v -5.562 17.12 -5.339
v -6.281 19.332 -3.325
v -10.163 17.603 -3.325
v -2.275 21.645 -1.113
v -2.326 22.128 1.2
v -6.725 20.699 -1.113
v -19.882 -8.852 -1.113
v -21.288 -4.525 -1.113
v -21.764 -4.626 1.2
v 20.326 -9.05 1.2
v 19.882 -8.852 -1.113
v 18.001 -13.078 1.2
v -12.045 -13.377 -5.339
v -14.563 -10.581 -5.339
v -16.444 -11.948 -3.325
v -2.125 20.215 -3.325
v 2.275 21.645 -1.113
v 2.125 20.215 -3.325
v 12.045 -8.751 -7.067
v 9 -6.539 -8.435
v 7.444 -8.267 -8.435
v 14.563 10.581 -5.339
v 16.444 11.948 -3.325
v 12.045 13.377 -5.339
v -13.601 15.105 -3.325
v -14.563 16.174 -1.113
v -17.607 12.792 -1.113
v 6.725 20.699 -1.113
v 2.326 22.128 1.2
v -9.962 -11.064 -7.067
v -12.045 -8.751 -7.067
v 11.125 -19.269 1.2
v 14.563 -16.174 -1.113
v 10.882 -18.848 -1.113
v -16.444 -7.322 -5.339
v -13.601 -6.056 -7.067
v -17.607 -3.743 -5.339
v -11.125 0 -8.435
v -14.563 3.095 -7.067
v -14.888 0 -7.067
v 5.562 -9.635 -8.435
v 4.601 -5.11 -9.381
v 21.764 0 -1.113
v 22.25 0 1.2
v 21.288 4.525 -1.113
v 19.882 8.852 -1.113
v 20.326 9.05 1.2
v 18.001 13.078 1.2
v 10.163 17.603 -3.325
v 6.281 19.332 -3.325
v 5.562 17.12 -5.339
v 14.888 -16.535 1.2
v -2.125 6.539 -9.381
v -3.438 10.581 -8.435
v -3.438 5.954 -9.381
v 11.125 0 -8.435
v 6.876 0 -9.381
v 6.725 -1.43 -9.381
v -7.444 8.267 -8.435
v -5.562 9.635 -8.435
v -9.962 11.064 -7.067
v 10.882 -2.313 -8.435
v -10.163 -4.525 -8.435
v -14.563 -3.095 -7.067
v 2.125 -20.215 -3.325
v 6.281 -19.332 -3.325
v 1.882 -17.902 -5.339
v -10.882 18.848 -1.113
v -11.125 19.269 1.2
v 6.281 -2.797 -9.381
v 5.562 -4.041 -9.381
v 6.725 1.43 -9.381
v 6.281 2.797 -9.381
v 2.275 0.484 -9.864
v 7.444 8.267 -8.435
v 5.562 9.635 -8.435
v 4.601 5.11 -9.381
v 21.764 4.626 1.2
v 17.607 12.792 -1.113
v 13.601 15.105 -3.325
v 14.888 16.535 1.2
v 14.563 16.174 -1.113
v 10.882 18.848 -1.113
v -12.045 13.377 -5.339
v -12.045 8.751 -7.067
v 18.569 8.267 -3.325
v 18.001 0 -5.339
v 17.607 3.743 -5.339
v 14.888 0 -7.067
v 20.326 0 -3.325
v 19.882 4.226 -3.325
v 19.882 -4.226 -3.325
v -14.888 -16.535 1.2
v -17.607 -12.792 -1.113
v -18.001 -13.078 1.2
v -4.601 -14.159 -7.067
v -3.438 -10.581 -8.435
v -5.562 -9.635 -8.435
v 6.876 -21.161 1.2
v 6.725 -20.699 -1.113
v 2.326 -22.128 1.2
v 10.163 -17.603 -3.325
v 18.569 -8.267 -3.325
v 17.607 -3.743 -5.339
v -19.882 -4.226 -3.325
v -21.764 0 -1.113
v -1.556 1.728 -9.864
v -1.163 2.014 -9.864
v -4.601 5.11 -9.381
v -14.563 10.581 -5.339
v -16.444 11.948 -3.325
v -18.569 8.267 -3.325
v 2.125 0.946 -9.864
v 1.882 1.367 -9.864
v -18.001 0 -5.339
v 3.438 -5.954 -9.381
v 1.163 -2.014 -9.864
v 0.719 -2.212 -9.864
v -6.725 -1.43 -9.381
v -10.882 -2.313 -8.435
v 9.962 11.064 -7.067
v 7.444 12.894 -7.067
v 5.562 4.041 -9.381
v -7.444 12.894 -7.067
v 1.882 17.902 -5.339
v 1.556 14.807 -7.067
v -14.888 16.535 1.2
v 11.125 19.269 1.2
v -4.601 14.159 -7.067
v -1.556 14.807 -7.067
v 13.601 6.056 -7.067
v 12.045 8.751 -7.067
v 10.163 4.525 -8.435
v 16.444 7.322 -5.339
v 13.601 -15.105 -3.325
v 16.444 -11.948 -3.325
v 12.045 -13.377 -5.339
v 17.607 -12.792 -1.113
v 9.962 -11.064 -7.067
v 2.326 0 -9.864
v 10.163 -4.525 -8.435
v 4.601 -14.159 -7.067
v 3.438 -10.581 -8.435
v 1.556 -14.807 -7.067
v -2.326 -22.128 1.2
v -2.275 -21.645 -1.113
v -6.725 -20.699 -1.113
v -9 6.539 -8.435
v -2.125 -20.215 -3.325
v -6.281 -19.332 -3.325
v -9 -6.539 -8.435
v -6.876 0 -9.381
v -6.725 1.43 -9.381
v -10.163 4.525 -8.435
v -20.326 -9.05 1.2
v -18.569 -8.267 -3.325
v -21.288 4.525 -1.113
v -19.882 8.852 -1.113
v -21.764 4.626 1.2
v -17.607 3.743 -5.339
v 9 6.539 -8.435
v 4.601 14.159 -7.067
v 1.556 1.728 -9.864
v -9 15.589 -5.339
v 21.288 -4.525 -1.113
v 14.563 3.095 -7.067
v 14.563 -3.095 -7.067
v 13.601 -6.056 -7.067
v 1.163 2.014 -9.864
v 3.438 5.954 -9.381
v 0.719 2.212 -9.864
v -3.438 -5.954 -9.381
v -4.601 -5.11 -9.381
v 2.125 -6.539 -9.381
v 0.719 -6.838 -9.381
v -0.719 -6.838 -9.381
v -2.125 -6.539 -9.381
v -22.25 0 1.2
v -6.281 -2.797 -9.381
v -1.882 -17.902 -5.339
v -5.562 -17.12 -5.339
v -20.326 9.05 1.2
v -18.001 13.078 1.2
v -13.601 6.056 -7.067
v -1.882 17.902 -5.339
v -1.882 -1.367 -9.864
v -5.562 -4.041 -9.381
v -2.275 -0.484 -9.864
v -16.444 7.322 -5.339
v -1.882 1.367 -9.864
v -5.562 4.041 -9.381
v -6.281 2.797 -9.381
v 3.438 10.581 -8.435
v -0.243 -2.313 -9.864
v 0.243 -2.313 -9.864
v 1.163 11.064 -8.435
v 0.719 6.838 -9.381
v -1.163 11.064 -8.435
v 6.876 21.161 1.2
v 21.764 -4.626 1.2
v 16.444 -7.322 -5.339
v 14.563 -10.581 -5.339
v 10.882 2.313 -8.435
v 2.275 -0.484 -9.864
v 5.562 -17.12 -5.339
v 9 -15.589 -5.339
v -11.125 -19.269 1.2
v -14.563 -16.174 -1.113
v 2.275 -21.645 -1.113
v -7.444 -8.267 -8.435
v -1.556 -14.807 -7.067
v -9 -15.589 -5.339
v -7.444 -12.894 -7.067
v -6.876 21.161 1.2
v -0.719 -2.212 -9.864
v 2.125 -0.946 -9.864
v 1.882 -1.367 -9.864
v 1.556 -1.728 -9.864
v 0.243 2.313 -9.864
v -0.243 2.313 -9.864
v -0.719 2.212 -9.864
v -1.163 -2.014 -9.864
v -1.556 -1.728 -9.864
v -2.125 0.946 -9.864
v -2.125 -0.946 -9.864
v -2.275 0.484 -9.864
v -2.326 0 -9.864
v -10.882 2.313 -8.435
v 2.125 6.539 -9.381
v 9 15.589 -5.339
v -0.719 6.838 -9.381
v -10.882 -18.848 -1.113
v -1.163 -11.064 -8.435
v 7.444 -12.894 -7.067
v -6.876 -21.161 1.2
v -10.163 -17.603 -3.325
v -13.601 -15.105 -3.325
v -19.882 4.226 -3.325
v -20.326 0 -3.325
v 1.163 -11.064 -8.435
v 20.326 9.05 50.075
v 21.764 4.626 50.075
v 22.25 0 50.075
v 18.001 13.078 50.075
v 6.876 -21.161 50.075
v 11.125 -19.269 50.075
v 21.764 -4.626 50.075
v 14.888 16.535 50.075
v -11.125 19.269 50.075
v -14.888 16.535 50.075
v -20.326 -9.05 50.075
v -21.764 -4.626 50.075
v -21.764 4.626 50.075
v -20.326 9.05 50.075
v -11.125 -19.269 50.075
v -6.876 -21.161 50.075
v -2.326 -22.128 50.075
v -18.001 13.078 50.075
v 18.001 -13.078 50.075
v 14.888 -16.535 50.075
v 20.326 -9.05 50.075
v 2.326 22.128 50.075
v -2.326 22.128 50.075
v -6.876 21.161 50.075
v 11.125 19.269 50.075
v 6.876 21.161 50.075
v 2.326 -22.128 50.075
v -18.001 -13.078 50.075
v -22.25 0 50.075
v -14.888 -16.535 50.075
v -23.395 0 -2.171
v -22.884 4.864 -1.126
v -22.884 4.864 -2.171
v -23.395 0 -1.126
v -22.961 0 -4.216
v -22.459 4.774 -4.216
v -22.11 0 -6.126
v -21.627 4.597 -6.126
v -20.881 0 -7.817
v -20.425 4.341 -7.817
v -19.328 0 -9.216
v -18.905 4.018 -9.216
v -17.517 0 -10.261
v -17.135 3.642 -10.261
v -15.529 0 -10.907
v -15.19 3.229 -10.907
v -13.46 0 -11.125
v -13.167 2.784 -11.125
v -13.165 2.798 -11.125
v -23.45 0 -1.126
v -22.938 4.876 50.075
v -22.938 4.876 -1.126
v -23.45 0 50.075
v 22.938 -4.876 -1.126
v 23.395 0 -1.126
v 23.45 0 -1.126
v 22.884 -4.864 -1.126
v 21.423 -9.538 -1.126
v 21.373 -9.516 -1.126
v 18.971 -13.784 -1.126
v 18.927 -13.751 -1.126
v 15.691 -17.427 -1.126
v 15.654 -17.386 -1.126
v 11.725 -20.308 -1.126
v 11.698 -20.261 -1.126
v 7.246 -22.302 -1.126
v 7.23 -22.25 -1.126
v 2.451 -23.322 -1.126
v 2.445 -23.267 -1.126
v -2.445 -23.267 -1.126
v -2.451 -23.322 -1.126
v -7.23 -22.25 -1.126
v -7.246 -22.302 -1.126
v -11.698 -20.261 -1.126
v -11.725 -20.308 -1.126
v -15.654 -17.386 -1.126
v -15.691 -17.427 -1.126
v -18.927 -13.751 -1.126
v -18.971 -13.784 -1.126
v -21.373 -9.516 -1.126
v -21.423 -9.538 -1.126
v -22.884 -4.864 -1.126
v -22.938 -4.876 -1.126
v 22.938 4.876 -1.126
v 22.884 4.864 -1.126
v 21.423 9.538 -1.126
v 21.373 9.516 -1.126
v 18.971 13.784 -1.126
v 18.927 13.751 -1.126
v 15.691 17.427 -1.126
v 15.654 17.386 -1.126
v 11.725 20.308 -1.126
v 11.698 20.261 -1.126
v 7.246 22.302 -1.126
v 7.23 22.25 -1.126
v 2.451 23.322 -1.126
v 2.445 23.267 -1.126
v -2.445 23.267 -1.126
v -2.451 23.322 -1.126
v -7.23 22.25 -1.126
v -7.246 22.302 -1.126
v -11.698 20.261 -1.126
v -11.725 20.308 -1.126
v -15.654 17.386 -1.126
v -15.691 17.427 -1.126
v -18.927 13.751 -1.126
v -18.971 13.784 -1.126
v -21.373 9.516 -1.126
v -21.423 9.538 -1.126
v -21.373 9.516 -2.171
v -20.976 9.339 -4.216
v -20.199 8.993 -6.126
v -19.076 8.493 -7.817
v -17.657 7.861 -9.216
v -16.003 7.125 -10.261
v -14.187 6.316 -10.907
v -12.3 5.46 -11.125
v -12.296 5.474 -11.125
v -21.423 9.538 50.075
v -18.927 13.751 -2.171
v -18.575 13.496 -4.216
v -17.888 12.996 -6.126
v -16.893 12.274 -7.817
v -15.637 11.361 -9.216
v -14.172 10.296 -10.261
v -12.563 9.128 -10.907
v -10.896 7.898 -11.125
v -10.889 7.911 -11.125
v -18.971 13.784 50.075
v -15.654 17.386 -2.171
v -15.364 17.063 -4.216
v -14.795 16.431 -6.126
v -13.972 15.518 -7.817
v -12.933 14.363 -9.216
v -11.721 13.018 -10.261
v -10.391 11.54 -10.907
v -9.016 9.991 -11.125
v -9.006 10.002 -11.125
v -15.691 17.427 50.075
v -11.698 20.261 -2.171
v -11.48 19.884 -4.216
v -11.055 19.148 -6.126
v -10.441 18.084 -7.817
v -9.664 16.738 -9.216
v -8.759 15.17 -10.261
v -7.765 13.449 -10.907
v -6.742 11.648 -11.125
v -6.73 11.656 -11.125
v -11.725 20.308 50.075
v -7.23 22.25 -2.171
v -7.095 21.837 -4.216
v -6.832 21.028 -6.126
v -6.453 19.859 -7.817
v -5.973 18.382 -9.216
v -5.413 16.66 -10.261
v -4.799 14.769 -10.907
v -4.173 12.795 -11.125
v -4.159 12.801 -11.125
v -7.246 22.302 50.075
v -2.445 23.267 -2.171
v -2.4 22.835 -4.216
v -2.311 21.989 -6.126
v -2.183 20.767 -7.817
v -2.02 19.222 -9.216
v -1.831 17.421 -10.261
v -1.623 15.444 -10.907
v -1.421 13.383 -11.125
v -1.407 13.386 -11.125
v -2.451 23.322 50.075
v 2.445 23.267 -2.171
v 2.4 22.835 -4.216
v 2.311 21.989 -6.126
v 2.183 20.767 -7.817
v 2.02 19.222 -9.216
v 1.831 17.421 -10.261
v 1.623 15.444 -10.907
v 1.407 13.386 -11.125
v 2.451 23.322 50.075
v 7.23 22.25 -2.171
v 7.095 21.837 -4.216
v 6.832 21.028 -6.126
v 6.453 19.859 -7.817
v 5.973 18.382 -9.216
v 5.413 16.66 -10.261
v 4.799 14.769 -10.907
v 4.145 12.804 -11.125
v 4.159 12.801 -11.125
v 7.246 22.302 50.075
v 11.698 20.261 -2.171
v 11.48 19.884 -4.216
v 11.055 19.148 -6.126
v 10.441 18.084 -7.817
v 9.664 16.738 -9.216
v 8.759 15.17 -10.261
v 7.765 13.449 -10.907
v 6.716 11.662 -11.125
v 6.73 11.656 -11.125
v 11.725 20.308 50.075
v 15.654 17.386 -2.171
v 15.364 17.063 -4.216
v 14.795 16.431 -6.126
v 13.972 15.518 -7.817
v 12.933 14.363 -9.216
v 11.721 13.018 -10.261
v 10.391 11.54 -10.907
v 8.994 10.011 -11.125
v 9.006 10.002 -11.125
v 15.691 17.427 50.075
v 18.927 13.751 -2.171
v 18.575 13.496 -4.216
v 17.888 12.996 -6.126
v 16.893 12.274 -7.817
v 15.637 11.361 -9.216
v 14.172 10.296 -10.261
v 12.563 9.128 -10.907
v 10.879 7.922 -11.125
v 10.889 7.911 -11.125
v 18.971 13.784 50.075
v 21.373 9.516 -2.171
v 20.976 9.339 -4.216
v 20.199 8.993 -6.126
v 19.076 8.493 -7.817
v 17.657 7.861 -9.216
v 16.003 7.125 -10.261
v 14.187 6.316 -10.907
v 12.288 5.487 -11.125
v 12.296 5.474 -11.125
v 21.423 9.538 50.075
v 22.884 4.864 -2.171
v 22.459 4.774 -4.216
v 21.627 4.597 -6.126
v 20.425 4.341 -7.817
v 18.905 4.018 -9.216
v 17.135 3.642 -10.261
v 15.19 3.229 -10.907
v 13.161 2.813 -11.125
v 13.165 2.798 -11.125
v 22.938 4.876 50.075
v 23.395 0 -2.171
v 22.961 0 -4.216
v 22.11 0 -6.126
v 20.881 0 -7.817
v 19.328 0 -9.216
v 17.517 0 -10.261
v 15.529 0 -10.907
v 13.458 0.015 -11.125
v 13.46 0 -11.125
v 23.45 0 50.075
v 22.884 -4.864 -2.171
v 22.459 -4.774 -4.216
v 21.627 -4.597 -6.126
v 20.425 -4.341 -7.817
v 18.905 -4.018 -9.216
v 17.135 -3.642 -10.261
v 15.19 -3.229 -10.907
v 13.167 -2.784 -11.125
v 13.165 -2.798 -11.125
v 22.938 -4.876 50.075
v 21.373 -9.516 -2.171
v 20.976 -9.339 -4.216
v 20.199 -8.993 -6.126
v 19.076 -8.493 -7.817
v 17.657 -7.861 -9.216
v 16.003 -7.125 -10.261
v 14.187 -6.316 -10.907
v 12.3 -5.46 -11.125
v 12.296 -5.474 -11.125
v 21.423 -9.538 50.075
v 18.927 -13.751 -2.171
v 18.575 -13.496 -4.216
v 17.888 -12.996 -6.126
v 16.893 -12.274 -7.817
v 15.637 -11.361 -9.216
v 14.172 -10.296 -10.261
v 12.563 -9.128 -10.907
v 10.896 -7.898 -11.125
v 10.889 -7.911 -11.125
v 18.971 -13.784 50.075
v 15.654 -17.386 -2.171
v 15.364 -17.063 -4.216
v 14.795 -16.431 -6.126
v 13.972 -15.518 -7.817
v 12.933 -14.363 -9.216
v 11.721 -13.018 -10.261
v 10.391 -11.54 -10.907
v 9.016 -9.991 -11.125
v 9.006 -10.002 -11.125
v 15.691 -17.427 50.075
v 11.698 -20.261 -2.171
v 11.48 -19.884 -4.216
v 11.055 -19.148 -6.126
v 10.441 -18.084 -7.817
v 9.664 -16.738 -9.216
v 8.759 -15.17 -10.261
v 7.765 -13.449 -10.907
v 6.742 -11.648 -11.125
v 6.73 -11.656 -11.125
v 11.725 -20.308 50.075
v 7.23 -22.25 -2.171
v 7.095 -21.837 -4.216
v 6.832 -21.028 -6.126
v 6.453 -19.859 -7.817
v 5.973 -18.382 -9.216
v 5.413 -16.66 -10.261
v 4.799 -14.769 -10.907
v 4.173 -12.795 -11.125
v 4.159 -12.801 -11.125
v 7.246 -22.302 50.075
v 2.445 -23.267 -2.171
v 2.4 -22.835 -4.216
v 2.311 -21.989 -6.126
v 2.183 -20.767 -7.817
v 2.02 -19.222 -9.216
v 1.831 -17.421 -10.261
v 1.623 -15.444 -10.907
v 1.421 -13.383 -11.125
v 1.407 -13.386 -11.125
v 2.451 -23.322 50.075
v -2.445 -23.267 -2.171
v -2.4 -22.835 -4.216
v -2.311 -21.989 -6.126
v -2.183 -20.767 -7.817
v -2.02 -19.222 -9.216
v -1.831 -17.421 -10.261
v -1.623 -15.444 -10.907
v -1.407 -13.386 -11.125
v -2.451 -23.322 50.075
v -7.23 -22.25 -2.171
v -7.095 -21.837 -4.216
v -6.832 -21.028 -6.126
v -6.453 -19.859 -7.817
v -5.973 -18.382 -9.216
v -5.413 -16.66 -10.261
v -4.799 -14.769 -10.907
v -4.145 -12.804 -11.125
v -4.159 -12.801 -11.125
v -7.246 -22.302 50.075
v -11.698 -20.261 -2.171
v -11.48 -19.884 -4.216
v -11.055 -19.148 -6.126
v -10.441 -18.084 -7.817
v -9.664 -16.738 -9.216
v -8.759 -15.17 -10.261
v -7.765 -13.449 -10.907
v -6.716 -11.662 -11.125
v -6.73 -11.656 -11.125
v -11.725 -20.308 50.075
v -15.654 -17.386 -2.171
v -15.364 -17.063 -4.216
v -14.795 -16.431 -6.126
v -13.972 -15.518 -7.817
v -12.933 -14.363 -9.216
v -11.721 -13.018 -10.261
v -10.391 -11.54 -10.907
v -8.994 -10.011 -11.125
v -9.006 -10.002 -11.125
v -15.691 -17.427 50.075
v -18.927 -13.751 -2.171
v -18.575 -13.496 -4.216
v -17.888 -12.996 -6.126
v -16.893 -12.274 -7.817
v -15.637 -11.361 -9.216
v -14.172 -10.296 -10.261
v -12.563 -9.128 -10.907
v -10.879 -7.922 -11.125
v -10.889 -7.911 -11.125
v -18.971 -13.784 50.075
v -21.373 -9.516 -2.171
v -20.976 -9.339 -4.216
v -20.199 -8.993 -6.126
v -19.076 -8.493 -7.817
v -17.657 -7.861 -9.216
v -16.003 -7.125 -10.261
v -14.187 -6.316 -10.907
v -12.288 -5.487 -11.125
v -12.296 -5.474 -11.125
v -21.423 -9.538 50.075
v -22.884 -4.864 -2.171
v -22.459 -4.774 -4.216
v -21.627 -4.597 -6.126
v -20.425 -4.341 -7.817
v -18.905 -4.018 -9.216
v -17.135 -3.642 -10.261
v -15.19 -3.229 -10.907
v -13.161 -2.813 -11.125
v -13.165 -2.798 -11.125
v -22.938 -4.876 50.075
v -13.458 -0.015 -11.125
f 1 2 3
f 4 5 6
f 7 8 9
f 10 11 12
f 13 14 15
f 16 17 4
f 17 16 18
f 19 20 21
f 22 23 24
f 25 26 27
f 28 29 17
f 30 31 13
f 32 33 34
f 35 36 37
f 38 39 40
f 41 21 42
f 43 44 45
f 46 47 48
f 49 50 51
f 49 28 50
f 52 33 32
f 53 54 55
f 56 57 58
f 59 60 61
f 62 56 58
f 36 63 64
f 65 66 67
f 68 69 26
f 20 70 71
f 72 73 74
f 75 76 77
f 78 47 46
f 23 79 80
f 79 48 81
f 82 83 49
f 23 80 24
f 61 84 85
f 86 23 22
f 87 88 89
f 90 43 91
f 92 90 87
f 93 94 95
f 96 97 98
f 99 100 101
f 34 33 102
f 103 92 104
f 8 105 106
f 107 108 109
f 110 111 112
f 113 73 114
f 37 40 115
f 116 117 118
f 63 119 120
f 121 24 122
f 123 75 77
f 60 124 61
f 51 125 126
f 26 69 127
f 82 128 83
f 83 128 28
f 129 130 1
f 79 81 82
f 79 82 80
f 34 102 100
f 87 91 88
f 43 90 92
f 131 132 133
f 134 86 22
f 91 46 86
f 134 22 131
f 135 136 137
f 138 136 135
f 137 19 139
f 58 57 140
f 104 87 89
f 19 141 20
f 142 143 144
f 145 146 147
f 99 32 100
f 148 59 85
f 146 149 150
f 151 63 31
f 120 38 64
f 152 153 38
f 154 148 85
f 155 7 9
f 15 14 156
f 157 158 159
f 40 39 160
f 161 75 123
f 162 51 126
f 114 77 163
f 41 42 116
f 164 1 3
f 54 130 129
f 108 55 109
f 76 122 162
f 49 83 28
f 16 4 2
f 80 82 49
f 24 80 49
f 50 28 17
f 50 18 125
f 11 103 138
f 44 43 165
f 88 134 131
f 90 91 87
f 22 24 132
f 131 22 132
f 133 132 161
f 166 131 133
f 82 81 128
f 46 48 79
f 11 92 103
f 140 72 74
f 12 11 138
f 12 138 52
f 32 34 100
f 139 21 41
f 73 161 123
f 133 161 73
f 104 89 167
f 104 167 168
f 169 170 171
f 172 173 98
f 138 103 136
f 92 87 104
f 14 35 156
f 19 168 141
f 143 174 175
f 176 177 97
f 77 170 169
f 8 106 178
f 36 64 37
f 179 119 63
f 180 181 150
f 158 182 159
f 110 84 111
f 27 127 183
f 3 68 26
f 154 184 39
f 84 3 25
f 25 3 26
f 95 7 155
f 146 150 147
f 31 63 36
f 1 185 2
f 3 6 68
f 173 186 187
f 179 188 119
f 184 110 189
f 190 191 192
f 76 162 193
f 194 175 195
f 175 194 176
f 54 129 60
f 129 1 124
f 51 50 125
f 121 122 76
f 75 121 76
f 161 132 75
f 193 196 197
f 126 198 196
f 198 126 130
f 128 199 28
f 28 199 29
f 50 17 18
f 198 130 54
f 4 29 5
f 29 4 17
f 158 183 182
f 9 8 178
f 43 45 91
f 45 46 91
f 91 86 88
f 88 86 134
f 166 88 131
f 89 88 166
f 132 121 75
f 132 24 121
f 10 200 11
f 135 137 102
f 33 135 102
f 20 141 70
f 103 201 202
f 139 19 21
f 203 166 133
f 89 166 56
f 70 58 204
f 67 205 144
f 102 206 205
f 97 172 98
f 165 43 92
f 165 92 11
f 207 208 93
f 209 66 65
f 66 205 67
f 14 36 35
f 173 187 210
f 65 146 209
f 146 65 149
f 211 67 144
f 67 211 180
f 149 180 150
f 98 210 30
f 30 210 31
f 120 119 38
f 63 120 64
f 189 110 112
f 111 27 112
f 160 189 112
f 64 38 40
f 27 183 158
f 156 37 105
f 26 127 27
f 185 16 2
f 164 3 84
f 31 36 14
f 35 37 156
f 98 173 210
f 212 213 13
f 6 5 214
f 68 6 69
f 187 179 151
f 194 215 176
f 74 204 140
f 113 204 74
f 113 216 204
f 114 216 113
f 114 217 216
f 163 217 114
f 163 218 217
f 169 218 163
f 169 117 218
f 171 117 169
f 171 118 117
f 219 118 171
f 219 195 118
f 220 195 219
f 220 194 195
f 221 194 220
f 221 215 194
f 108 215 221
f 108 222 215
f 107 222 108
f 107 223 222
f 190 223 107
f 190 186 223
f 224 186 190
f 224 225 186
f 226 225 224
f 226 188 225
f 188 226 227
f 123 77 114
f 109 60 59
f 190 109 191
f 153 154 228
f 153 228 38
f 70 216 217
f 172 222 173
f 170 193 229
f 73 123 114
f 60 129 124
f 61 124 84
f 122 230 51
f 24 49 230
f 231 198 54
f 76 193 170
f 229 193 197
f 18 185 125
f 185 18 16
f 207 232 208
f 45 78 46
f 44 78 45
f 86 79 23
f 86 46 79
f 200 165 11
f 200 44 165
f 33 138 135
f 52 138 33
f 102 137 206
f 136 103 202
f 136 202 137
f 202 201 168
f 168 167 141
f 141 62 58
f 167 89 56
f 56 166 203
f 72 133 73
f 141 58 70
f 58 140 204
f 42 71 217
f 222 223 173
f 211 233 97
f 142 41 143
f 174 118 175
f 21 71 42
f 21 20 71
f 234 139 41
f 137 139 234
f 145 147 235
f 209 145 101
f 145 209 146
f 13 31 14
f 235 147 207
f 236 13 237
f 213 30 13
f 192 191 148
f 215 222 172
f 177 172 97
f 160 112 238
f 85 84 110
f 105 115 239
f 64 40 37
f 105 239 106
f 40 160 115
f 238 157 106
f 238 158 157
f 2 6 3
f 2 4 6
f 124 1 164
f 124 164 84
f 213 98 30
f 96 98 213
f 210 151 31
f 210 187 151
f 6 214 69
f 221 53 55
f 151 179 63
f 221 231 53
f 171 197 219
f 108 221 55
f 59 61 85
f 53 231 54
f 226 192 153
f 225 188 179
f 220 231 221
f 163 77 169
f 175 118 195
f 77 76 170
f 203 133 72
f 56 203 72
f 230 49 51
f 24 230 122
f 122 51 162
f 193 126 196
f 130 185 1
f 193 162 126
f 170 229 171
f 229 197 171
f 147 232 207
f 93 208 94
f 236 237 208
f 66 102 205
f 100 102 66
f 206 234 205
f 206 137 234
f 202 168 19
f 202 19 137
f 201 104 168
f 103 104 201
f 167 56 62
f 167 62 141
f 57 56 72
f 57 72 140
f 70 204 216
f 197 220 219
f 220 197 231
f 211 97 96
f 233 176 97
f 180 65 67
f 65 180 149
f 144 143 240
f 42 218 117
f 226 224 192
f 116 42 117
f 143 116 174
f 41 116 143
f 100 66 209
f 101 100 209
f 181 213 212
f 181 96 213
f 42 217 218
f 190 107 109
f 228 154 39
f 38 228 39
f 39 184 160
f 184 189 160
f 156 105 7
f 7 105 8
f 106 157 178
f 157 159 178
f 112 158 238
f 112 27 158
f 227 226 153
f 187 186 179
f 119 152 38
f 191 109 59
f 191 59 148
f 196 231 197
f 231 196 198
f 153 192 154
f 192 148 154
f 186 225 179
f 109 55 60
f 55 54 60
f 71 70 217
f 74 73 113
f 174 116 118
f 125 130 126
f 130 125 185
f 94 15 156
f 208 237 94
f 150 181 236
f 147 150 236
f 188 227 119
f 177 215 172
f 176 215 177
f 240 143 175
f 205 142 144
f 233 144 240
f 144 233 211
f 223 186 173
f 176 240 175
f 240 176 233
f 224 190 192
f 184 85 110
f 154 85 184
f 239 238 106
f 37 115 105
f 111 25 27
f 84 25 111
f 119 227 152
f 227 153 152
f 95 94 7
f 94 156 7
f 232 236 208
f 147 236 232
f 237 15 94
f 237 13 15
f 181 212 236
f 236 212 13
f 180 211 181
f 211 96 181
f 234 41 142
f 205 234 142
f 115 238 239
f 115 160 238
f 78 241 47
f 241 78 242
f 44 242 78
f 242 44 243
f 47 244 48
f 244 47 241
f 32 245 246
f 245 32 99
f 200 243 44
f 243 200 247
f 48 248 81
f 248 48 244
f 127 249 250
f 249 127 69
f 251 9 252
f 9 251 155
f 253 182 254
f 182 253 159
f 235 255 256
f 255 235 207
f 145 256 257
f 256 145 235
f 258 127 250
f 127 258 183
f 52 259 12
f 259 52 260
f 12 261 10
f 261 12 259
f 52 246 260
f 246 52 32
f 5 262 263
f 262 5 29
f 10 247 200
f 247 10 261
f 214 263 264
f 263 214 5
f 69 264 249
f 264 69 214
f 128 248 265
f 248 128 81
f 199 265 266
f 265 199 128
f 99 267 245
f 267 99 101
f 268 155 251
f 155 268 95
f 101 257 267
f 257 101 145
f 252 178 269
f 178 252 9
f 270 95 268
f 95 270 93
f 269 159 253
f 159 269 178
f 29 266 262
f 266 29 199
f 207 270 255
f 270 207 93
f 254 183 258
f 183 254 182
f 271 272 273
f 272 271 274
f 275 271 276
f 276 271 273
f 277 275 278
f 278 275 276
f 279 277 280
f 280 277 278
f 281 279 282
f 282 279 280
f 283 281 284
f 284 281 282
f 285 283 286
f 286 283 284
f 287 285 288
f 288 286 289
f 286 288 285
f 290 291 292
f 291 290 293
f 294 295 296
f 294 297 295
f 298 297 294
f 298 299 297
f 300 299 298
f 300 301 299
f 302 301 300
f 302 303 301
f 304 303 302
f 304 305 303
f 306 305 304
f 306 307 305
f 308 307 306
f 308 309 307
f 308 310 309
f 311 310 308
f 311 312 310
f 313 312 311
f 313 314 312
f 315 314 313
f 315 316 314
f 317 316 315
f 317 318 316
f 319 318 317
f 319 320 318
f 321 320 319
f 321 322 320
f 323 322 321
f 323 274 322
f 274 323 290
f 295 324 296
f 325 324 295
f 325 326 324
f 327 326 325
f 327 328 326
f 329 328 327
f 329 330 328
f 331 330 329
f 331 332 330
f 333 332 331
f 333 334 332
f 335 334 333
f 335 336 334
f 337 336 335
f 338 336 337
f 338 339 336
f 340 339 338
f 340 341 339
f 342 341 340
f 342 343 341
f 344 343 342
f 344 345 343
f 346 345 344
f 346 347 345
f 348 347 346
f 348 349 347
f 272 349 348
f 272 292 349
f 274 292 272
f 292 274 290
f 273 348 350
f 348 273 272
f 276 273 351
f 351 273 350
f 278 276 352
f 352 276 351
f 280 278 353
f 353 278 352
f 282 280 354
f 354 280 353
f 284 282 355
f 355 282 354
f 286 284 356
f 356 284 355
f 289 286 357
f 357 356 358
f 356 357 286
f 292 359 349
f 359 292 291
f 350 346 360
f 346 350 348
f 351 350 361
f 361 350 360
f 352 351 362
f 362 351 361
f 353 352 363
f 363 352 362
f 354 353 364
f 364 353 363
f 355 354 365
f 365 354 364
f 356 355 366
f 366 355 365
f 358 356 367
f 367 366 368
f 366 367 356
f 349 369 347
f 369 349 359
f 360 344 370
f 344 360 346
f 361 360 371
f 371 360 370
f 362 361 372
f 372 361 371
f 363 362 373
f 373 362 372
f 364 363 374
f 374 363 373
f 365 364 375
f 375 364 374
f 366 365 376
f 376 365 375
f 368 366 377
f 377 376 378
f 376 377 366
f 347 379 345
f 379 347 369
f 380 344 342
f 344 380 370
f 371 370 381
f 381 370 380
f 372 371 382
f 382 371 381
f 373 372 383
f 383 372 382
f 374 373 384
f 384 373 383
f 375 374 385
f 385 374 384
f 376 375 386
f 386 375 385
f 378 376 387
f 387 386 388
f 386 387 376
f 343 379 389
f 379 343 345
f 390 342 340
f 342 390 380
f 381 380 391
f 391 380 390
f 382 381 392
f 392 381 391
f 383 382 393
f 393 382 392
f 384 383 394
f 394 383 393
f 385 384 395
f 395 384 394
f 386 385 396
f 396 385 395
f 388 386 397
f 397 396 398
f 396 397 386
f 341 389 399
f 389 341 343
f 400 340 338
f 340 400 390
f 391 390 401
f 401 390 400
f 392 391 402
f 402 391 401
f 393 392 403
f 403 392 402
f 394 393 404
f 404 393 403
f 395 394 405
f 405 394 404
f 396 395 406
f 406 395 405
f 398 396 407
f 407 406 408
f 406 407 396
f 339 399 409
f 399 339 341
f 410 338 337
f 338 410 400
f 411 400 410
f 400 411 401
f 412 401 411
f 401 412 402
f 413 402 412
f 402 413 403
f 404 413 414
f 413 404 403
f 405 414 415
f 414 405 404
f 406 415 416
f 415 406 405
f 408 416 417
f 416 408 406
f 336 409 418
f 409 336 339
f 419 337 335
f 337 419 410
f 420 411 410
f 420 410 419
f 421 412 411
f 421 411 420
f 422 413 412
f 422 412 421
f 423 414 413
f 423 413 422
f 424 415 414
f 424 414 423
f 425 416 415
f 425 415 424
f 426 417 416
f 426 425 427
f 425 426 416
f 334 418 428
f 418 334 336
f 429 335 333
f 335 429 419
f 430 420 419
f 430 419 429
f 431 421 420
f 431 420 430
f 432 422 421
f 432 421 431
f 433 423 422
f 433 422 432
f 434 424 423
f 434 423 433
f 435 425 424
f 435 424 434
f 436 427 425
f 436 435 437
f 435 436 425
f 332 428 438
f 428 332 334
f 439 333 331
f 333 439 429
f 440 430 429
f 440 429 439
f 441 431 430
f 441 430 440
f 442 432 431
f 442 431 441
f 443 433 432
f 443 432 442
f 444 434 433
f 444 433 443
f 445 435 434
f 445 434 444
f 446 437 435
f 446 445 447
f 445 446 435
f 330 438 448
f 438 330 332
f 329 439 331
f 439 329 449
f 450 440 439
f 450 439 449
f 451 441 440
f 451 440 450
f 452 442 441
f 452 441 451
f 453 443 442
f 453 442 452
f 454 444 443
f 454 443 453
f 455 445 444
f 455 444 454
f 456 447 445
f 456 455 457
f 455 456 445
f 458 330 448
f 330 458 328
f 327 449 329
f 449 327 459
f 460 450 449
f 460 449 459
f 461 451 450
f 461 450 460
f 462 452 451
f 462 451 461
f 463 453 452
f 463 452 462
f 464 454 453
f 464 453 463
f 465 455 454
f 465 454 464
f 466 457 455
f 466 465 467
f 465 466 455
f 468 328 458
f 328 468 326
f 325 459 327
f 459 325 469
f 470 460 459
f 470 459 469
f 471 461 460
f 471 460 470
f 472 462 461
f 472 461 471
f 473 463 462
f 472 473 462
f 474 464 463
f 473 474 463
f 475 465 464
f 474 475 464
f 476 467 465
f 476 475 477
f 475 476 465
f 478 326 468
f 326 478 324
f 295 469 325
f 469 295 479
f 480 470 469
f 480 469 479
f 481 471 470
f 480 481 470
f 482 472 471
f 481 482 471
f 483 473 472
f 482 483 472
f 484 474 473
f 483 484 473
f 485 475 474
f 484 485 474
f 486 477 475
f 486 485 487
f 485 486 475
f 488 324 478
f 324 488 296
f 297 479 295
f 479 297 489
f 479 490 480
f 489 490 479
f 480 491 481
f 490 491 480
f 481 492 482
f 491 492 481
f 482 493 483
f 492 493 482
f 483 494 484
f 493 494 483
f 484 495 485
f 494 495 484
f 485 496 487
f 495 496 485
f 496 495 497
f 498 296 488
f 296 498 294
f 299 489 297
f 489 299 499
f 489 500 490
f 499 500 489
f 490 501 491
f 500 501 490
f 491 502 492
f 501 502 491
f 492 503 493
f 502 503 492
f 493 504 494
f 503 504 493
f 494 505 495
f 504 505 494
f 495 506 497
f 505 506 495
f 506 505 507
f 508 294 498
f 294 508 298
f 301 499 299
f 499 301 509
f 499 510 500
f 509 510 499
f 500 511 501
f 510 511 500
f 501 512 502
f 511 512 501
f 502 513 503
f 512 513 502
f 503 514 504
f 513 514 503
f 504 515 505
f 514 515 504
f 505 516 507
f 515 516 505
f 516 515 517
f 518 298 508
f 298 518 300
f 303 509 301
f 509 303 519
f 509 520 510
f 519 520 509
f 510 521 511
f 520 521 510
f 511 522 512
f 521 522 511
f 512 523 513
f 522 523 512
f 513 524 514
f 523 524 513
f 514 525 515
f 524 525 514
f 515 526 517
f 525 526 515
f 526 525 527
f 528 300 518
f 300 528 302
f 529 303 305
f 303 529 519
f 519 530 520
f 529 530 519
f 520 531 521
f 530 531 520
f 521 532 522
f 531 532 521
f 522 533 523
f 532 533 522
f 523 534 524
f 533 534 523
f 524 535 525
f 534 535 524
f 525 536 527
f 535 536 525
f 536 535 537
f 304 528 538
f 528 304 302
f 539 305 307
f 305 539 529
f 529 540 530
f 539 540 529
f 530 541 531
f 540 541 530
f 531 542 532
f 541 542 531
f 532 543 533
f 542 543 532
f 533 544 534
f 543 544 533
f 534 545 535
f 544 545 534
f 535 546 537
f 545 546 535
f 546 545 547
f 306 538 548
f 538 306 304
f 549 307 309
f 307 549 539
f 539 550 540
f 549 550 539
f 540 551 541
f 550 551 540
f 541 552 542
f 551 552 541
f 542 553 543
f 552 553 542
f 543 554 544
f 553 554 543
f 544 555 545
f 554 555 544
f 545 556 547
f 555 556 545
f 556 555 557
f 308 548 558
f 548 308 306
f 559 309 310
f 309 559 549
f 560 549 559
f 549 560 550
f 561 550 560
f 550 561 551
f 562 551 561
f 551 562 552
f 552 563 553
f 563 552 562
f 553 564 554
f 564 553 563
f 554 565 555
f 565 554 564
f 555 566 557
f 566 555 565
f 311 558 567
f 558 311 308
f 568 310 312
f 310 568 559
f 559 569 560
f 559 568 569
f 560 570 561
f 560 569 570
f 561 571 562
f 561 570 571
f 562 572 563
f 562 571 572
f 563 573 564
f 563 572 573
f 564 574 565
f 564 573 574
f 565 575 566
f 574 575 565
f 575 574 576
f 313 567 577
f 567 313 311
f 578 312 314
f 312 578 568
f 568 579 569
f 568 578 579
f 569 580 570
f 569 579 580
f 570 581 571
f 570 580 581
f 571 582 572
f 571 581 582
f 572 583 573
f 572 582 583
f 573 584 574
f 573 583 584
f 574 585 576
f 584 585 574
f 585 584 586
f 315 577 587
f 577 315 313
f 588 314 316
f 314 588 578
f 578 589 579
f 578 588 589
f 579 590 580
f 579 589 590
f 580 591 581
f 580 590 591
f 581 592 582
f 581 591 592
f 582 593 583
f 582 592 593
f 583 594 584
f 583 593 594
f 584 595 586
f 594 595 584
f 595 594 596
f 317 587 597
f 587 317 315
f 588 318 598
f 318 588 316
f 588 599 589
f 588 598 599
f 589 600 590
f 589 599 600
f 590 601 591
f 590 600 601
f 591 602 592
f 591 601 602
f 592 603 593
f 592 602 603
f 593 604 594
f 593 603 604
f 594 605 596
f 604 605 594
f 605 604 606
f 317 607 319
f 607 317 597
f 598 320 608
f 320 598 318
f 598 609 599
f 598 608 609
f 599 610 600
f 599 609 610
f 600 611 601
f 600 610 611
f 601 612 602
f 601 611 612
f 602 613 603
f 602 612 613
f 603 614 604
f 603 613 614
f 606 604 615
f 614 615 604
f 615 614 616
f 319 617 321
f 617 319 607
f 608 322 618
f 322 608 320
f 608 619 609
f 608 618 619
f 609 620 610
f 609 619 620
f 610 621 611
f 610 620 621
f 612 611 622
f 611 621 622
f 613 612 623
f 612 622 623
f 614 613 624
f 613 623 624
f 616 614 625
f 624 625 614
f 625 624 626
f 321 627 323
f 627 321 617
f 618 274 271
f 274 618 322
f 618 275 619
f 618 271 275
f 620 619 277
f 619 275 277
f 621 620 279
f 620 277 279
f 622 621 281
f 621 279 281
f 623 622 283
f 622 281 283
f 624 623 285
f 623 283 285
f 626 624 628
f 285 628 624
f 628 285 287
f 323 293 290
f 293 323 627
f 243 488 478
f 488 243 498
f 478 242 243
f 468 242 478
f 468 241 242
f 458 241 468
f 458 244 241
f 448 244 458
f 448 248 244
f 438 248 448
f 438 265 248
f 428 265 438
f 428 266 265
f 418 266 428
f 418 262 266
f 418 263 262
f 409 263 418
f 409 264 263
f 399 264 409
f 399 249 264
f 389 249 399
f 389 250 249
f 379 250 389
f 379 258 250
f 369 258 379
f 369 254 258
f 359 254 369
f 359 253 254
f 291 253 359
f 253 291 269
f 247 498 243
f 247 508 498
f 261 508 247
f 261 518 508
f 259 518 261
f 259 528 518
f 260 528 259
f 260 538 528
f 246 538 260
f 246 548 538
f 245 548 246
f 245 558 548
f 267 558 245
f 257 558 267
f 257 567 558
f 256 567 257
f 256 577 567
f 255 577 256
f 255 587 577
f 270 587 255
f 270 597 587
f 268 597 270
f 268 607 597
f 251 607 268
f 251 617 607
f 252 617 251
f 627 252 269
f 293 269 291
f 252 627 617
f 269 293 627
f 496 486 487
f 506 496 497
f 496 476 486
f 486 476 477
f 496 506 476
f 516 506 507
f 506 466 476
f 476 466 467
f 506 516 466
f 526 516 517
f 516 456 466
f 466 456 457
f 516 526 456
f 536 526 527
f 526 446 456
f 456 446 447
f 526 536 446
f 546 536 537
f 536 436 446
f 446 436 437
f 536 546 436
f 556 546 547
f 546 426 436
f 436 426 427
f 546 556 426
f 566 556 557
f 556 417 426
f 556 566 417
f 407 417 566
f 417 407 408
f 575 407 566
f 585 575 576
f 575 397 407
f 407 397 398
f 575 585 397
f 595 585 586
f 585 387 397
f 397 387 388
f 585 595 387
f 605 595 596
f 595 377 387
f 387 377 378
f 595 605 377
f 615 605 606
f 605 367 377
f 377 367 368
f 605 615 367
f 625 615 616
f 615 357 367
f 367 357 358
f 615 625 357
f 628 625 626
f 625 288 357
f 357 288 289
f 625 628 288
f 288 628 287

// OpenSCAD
//Massage Wand Head Cover, Chamfer tipped version
//Designed to be easier to print than the rounded version.
//CudaTox (@cudatox) 2017

/*

Copyright 2017 Cudatox

Redistribution and use in source and binary forms, with or without modification, are permitted provided that the following conditions are met:

1. Redistributions of source code must retain the above copyright notice, this list of conditions and the following disclaimer.

2. Redistributions in binary form must reproduce the above copyright notice, this list of conditions and the following disclaimer in the documentation and/or other materials provided with the distribution.

THIS SOFTWARE IS PROVIDED BY THE COPYRIGHT HOLDERS AND CONTRIBUTORS "AS IS" AND ANY EXPRESS OR IMPLIED WARRANTIES, INCLUDING, BUT NOT LIMITED TO, THE IMPLIED WARRANTIES OF MERCHANTABILITY AND FITNESS FOR A PARTICULAR PURPOSE ARE DISCLAIMED. IN NO EVENT SHALL THE COPYRIGHT HOLDER OR CONTRIBUTORS BE LIABLE FOR ANY DIRECT, INDIRECT, INCIDENTAL, SPECIAL, EXEMPLARY, OR CONSEQUENTIAL DAMAGES (INCLUDING, BUT NOT LIMITED TO, PROCUREMENT OF SUBSTITUTE GOODS OR SERVICES; LOSS OF USE, DATA, OR PROFITS; OR BUSINESS INTERRUPTION) HOWEVER CAUSED AND ON ANY THEORY OF LIABILITY, WHETHER IN CONTRACT, STRICT LIABILITY, OR TORT (INCLUDING NEGLIGENCE OR OTHERWISE) ARISING IN ANY WAY OUT OF THE USE OF THIS SOFTWARE, EVEN IF ADVISED OF THE POSSIBILITY OF SUCH DAMAGE.

*/

//INSTRUCTIONS

//This is a cover for the head of the massager intended to prevent fluid ingress.
//It is designed to be printed in a flexible filament such as TPU and slipped over
//the head of the massager to prevent fluid ingress. 

//This version of the cover uses a chamfer rather than a sphere in order 
//to make it easier to print.

//Measure your massager tip and set outside_dia and head_body_length you'll also need
//to get sphere_top_scale from the script (default: 0.5)


cover_thickness = 1.2;          //Thickness of the cover
sphere_top_scale = 0.5;         //"Roundness" of the tip
overall_length = 60;            //Overall length of the massager head
outside_dia = 44.5;             //Outside diameter of massager tip. You may want to add a small factor to this if it is too tight.
chamfer_radius = 10;

added_length = cover_thickness;
sphere_tip_length = (outside_dia * sphere_top_scale)/2;
overall_cover_length = overall_length + cover_thickness;

$fs = 0.5;
echo(outside_dia);
echo(overall_length);
echo(overall_length - (outside_dia * sphere_top_scale)/2);

module chamfer_cut(major, minor){
    rotate_extrude(angle=360)
    translate([major,0,0])
    rotate([0,0,90])
    difference(){
        square([minor,minor]);
        translate([minor, minor,0])
        circle(r=minor);
    }
}

difference(){
    union(){
        translate([0,0, -sphere_tip_length])
        cylinder(d = outside_dia + cover_thickness * 2, h = overall_cover_length, center=false);
    }
    union(){
        translate([0,0, cover_thickness]){
        scale([1,1,sphere_top_scale])
            sphere(d = outside_dia, center=true);
        cylinder(d = outside_dia, h = overall_length - sphere_tip_length, center=false);
        }
        translate([0,0, -sphere_tip_length - 0.001])
            chamfer_cut(outside_dia/2 + cover_thickness, chamfer_radius);
    }
}
